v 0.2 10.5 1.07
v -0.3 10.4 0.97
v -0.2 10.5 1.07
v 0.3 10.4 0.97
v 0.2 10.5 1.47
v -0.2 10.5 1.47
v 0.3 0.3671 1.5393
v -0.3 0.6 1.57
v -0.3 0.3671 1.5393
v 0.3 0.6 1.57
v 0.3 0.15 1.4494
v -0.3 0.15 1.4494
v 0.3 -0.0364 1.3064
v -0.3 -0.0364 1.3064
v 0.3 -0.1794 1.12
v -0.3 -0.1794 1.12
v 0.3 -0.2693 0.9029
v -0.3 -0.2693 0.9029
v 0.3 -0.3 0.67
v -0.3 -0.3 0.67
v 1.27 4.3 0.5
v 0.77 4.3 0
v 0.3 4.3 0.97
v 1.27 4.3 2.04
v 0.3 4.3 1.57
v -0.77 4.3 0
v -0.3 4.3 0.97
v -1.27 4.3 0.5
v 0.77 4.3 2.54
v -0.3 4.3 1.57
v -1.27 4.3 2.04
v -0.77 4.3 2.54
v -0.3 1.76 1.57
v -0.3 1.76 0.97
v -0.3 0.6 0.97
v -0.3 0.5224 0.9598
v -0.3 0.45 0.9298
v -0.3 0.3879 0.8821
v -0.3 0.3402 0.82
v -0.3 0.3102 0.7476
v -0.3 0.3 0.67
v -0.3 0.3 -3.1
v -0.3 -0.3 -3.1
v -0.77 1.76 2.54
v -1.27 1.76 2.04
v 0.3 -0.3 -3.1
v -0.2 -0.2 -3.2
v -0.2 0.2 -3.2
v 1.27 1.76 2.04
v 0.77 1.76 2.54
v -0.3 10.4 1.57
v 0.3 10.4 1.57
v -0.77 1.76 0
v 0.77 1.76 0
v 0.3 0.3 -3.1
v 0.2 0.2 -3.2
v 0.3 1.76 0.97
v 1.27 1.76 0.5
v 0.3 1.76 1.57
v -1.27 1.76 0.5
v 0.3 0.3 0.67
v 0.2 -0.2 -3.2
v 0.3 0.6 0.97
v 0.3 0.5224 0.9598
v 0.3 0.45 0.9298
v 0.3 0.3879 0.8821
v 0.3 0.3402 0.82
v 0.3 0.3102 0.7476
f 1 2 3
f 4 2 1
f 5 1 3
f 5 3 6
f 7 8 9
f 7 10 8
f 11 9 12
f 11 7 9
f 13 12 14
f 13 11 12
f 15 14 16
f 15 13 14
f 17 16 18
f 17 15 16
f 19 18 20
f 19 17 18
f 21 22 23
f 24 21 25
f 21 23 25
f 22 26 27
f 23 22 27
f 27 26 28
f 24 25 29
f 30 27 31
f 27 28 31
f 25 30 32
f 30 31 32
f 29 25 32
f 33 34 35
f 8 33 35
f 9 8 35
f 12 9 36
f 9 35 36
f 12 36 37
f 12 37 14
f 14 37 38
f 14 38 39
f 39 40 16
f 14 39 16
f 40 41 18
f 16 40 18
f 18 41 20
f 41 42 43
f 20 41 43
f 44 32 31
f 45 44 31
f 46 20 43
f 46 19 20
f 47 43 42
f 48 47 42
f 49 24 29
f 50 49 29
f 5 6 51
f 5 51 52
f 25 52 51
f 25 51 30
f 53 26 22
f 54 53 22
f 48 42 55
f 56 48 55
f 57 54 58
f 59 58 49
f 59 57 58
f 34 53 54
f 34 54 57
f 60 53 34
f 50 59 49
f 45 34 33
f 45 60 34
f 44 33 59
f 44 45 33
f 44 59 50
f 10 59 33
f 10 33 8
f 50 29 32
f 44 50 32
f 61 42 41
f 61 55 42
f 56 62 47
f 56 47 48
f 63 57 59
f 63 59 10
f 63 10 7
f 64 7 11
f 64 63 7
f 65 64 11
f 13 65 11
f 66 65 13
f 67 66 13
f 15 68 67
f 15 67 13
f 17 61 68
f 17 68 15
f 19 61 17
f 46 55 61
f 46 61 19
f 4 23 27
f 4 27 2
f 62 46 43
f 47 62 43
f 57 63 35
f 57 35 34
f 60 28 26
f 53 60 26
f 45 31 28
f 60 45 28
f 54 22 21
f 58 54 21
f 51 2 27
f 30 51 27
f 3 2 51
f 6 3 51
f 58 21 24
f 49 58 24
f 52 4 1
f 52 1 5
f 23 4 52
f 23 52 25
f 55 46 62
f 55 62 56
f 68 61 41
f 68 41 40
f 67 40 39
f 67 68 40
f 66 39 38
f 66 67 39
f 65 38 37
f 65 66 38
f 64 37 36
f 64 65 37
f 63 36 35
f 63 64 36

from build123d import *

# Parameters (mm, degrees)
CONTACT_DEPTH = 0.3
CHAMFER1_SIZE = 0.1
PLASTIC_DEPTH = 2.54


with BuildPart() as part:
    # Sketch2 → Contact (new, symmetric)
    with BuildSketch(Plane(origin=(0, 0, 0), x_dir=(0, -1, 0), z_dir=(1, 0, 0))):
        with BuildLine():
            Line((0.3, 3.2), (-0.3, 3.2))
            Line((-0.3, 3.2), (-0.3, -0.67))
            ThreePointArc((-0.3, -0.67), (-0.387867966, -0.882132034), (-0.6, -0.97))
            Line((-0.6, -0.97), (-10.5, -0.97))
            Line((-10.5, -0.97), (-10.5, -1.57))
            Line((-10.5, -1.57), (-0.6, -1.57))
            ThreePointArc((-0.6, -1.57), (0.036396103, -1.306396103), (0.3, -0.67))
            Line((0.3, -0.67), (0.3, 3.2))
        make_face()
    extrude(amount=CONTACT_DEPTH, both=True)

    # Chamfer1
    chamfer1_edges = [part.edges().sort_by_distance(p)[0] for p in [
        (0.3, 10.5, 1.27),
        (0, 0.3, -3.2),
        (0, -0.3, -3.2),
        (0, 10.5, 1.57),
        (0, 10.5, 0.97),
        (0.3, 0, -3.2),
        (-0.3, 0, -3.2),
        (-0.3, 10.5, 1.27),
    ]]
    chamfer(chamfer1_edges, length=CHAMFER1_SIZE)

    # Sketch1 → Plastic (add)
    with BuildSketch(Plane(origin=(0, 4.3, 0), x_dir=(0, 0, -1), z_dir=(0, 1, 0))):
        Polygon((-2.04, 1.27), (-0.5, 1.27), (0, 0.77), (0, -0.77), (-0.5, -1.27), (-2.04, -1.27), (-2.54, -0.77), (-2.54, 0.77), align=None)
    extrude(amount=-PLASTIC_DEPTH)


solid = part.part
